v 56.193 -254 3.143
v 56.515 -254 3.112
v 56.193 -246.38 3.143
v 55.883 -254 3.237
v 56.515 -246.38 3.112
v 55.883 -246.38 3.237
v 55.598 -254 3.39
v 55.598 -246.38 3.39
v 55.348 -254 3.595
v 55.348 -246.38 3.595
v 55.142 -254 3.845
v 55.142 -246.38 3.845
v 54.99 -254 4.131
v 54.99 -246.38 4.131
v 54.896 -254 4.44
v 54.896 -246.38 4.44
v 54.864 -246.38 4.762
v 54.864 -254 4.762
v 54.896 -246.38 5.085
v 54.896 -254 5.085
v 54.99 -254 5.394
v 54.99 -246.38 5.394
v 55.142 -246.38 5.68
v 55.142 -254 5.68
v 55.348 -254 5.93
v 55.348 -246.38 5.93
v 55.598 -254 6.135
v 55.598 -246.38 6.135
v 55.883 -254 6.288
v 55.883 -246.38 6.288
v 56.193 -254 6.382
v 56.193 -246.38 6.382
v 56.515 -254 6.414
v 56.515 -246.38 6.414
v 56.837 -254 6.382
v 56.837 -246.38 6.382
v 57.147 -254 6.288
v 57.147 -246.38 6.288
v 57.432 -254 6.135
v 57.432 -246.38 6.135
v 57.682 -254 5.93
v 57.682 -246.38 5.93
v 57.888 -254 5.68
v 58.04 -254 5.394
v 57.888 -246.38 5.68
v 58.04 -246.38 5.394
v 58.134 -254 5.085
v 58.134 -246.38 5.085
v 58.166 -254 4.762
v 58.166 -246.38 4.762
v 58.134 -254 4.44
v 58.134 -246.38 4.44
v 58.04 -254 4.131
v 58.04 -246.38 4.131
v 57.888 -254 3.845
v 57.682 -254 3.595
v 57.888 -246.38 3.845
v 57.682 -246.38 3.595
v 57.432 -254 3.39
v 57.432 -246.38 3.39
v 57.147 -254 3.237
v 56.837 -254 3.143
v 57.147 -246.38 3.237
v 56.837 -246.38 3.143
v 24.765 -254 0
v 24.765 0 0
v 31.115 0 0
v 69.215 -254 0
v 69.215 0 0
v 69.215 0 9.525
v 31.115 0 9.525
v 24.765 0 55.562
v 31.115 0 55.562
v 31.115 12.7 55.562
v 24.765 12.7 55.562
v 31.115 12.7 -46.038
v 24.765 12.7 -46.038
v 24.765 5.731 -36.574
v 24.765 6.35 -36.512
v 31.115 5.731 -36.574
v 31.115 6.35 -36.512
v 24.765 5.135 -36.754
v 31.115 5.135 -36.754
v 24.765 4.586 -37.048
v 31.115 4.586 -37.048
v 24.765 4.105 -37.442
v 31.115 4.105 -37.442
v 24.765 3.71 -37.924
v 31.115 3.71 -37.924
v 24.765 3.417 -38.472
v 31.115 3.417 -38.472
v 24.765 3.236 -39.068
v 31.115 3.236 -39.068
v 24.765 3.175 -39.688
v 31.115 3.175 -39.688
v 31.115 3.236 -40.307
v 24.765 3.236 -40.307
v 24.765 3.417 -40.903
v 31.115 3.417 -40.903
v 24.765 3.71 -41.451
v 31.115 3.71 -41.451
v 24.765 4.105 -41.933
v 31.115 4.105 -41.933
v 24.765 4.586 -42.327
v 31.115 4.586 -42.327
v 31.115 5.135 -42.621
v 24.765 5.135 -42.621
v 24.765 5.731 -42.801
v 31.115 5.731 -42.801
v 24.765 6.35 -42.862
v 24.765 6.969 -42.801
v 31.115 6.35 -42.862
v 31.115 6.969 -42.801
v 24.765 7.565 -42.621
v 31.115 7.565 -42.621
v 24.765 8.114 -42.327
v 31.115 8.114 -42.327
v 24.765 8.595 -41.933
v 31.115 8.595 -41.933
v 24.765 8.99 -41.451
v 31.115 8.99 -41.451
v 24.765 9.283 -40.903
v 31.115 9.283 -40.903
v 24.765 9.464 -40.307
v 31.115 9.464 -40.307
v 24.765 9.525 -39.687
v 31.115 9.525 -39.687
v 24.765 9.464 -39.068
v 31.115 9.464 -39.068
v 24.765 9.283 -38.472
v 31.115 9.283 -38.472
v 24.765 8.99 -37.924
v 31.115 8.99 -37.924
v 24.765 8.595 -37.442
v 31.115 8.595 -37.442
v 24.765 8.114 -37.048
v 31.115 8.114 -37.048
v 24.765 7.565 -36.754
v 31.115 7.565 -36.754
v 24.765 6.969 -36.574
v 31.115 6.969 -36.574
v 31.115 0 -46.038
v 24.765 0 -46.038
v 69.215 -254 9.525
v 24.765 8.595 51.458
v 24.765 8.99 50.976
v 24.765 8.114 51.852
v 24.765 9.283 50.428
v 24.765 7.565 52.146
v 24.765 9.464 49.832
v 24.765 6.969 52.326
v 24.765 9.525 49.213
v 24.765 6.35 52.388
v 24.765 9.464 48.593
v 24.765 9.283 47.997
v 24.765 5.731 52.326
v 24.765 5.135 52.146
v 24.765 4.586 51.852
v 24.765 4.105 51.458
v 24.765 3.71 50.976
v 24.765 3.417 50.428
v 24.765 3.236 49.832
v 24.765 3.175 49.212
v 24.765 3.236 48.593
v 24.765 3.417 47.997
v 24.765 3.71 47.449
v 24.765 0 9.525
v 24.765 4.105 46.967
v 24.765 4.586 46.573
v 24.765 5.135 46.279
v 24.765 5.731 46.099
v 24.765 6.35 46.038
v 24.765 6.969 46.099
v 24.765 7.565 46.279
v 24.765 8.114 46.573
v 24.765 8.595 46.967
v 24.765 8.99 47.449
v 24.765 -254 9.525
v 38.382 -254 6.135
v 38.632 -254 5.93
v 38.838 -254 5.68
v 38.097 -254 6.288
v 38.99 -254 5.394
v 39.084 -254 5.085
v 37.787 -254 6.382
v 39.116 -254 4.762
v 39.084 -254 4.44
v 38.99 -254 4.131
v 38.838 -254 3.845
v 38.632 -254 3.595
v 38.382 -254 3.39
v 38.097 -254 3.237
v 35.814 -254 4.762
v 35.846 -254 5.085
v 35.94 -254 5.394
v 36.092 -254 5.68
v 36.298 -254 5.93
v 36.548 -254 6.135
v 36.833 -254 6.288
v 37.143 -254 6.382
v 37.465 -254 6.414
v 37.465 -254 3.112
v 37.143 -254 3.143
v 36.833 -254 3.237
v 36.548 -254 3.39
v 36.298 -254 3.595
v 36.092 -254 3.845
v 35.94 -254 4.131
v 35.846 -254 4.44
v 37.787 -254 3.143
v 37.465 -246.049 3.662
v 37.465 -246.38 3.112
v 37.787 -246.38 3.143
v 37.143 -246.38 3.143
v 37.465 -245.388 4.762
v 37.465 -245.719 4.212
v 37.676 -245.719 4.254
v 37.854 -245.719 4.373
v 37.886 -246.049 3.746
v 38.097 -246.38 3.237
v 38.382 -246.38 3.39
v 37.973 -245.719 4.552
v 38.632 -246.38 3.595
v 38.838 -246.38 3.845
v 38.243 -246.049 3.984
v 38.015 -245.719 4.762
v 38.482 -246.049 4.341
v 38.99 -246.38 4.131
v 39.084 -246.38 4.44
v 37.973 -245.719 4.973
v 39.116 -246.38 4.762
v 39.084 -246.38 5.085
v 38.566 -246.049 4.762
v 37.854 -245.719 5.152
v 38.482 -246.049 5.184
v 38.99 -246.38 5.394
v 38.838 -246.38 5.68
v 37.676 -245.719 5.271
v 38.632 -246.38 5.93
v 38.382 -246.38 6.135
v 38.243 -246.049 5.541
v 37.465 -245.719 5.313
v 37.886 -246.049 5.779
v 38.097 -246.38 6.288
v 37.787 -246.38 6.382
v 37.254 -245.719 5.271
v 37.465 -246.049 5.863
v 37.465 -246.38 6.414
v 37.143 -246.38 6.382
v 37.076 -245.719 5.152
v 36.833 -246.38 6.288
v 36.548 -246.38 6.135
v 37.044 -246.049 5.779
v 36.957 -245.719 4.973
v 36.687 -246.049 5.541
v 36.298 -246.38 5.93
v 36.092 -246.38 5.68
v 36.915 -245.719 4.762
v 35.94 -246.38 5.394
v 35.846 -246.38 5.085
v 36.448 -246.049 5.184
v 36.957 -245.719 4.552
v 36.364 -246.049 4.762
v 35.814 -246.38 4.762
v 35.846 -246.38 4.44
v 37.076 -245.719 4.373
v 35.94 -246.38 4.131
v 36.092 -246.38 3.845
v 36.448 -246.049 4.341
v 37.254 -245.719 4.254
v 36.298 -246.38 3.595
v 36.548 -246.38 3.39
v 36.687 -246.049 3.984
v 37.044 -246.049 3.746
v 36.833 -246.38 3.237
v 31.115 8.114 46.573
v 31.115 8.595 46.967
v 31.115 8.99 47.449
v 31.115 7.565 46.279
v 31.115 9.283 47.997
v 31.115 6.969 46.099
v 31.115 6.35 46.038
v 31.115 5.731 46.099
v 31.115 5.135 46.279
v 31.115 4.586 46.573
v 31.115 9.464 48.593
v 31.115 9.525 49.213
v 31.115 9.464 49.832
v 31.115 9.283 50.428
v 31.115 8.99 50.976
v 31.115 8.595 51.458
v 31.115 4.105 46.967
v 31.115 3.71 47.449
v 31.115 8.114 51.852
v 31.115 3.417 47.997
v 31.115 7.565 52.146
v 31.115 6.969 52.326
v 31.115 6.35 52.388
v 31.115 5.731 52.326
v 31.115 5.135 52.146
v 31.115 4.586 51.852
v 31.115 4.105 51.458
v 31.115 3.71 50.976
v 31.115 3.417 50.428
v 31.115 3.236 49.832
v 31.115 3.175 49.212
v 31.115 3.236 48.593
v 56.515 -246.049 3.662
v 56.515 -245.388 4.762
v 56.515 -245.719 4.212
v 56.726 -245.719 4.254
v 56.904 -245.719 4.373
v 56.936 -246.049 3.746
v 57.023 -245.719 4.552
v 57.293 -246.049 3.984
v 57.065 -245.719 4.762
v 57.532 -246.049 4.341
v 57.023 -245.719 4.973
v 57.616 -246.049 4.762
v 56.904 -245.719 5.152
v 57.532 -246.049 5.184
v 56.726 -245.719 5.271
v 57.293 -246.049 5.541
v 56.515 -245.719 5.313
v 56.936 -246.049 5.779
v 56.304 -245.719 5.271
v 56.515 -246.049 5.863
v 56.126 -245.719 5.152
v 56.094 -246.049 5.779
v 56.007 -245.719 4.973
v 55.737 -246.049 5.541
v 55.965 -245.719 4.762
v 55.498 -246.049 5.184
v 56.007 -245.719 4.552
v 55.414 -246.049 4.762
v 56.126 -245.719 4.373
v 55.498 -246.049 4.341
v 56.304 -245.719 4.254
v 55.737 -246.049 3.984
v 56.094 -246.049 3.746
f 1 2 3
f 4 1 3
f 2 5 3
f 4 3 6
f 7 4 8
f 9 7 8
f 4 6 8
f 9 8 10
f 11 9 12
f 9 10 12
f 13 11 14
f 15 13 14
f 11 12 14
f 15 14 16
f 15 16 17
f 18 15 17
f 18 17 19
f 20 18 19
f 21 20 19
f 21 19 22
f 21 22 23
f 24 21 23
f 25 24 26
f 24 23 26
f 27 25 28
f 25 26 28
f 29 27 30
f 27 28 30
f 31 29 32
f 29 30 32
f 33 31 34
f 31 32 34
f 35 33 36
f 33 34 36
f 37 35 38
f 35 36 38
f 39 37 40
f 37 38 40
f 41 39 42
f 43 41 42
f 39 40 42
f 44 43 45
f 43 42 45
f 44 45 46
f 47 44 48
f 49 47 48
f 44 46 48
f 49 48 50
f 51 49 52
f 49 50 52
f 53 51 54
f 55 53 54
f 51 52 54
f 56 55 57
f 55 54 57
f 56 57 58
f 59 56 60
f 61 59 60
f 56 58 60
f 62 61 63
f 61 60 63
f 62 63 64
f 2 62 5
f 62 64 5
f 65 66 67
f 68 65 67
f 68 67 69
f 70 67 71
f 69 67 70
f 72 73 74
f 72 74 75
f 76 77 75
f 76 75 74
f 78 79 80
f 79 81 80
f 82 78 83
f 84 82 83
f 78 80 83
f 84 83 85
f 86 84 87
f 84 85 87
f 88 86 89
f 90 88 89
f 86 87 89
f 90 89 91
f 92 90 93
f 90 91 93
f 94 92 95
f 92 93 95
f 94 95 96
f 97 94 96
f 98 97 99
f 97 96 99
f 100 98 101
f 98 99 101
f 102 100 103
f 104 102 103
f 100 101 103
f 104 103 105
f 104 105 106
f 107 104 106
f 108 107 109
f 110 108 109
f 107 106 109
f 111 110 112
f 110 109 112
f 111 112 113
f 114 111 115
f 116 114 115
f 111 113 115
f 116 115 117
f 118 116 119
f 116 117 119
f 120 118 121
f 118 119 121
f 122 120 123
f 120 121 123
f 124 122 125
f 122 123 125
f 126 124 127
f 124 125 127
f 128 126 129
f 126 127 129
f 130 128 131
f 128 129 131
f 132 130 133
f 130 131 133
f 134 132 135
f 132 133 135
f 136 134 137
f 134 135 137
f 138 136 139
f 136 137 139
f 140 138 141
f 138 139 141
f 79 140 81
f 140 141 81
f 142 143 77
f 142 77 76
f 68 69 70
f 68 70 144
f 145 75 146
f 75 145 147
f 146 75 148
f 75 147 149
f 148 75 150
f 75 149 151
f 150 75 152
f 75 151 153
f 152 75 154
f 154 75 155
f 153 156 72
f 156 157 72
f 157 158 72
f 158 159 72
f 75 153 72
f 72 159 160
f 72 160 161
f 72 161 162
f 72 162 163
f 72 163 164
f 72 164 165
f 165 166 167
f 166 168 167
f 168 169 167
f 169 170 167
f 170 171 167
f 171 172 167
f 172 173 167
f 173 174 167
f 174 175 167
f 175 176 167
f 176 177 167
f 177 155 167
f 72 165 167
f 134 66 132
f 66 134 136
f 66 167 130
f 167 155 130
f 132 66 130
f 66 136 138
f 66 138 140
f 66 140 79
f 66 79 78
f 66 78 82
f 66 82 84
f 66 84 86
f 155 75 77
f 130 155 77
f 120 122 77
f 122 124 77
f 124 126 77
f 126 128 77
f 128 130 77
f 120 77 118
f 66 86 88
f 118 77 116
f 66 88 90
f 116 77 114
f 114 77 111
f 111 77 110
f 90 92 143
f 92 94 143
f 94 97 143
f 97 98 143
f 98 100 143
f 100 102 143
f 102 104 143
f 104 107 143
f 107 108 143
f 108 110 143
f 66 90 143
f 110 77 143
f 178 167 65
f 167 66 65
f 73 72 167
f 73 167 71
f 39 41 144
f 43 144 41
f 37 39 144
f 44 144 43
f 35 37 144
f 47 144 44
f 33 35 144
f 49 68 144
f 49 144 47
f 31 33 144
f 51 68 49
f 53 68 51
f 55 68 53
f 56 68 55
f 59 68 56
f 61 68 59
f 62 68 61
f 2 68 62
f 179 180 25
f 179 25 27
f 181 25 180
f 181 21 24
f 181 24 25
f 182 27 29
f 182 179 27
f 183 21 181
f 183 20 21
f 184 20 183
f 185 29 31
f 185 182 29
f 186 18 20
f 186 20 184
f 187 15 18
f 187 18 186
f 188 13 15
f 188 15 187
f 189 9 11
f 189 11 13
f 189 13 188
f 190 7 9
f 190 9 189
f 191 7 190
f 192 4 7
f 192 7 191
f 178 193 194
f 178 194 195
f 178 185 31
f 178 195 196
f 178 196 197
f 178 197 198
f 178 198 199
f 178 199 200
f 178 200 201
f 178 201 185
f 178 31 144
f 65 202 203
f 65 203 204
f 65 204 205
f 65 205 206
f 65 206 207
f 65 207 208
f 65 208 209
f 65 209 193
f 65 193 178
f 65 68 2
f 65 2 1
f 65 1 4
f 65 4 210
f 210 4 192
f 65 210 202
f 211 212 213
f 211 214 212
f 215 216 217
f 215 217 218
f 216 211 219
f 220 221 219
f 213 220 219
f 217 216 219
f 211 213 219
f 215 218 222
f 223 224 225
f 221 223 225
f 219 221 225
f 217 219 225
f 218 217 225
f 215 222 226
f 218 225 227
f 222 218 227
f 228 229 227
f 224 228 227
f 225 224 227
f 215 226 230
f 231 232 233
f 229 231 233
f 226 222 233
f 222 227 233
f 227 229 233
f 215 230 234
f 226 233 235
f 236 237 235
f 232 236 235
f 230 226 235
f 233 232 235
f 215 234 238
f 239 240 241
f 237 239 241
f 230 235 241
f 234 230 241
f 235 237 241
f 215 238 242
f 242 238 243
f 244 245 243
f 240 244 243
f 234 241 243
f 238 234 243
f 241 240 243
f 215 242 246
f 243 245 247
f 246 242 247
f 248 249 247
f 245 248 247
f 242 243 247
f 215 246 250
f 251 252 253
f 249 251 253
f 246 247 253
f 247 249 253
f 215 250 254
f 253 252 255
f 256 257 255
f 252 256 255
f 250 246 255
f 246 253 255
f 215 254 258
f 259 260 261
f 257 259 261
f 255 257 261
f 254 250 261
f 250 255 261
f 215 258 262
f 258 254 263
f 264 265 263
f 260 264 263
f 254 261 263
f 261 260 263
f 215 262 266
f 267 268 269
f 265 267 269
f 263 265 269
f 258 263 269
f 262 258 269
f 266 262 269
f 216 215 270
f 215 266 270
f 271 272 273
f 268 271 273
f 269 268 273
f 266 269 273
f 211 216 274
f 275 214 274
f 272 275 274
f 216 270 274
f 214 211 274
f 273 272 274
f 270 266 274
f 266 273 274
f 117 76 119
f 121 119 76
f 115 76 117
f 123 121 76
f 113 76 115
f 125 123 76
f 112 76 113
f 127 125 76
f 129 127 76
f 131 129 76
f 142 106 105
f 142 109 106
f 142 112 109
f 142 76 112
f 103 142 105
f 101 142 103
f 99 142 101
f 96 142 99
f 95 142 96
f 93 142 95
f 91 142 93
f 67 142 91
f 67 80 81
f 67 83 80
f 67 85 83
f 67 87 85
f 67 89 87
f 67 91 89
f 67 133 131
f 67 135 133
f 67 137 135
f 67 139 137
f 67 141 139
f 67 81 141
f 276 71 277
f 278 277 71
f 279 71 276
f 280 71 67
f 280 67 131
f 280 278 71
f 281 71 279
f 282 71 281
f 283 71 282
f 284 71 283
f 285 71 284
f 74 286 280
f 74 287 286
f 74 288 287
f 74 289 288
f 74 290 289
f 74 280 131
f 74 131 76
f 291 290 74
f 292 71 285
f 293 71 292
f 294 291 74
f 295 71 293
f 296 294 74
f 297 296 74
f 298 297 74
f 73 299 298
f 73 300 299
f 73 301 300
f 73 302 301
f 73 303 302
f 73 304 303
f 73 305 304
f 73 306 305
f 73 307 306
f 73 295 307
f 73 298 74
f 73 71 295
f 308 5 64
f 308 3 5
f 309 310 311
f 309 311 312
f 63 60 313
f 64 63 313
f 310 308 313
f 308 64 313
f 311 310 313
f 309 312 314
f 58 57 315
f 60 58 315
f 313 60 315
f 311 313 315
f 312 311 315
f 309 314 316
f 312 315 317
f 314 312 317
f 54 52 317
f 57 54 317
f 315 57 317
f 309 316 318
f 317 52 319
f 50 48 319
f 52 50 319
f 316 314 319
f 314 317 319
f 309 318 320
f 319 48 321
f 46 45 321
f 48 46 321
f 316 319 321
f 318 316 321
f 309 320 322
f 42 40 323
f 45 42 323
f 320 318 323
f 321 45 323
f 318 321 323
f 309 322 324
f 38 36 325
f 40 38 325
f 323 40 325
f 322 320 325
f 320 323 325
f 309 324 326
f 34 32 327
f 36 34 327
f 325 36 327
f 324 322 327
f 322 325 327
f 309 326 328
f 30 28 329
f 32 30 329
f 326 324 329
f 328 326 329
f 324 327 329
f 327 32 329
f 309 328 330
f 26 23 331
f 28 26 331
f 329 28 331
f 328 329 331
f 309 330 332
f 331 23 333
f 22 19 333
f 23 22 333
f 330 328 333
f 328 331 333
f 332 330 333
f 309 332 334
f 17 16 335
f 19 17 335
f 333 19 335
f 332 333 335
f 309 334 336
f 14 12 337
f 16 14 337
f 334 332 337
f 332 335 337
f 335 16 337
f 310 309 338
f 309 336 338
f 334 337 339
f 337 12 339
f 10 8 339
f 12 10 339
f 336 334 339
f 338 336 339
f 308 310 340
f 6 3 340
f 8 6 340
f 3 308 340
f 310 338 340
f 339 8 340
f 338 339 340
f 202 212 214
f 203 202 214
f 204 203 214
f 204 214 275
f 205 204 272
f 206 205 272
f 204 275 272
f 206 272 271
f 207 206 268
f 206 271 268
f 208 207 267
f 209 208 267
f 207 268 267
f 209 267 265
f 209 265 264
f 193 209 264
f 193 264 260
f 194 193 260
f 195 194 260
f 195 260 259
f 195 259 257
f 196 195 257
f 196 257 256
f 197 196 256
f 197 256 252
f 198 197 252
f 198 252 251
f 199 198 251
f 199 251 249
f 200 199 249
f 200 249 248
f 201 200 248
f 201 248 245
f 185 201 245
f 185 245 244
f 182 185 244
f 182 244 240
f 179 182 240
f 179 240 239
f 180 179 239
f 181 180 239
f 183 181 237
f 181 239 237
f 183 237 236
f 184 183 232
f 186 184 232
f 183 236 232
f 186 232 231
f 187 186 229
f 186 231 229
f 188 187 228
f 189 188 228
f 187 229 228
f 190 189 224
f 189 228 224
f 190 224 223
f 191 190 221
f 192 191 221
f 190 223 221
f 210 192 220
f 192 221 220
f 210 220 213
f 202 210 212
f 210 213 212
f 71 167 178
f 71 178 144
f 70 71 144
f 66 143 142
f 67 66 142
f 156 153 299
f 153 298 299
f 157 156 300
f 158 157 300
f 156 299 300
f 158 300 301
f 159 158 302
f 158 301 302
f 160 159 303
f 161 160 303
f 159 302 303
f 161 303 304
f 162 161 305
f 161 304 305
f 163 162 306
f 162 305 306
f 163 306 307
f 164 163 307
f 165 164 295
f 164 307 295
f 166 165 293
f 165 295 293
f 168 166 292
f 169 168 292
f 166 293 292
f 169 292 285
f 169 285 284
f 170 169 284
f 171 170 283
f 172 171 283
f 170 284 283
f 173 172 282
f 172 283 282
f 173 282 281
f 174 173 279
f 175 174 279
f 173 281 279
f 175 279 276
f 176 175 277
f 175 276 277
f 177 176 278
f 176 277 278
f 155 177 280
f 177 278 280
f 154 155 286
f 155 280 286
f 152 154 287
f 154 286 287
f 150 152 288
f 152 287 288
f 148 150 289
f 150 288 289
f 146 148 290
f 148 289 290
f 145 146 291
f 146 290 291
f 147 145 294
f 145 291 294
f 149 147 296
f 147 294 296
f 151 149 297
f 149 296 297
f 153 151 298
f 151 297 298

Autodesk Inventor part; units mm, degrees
ref_plane "YZ Plane" through (0, 0, 0) normal (1, 0, 0) x (0, 1, 0)
ref_plane "XZ Plane" through (0, 0, 0) normal (0, 1, 0) x (-1, 0, 0)
ref_plane "XY Plane" through (0, 0, 0) normal (0, 0, 1) x (1, 0, 0)
sketch "Sketch1" plane through (0, 0, 0) normal (0, 0, 1) x (1, 0, 0)
  line L0 (0, 0) -> (69.215, 0)
  line L1 (69.215, 0) -> (69.215, -254)
  line L2 (69.215, -254) -> (0, -254)
  line L3 (0, -254) -> (0, 0)
  dimension "d0" = 69.215
  dimension "d1" = 254
extrude "Extrusion1" add sketch "Sketch1" along normal blind 9.525
sketch "Sketch4" plane through (0, 0, 0) normal (0, 0, -1) x (-1, 0, 0)
  line L0 (-69.215, -254) -> (0, -254) projected
  line L1 (0, 0) -> (-24.765, 0)
  line L2 (-24.765, 0) -> (-24.765, -254)
  line L3 (-24.765, -254) -> (0, -254)
  line L4 (0, -254) -> (0, 0)
  dimension "d11" = 24.765
extrude "Extrusion4" cut sketch "Sketch4" against normal blind 127
sketch "Sketch5" plane through (69.215, -254, 0) normal (0, -1, 0) x (1, 0, 0)
  point P0 (-69.215, 0)
sketch "Sketch9" plane through (69.215, -254, 0) normal (0, -1, 0) x (1, 0, 0)
  line L0 (-44.45, 9.525) -> (-44.45, 0) projected
  line L1 (0, 0) -> (0, 9.525) projected
  point P0 (-69.215, 0)
  point P1 (-12.7, 4.7625)
  point P2 (-31.75, 4.7625)
hole "Hole2" at (37.465, -254, 4.7625) at (56.515, -254, 4.7625) direction (0, 1, 0) diameter 3.302 depth 7.62 tip angle 118 thread size "8-32 UNC" class "2B" standard "ANSI Unified Screw Threads"
sketch "Sketch11" plane through (69.215, 0, 9.525) normal (0, 1, 0) x (1, 0, 0)
  line L0 (-38.1, -46.0375) -> (-44.45, -46.0375)
  line L1 (-44.45, -46.0375) -> (-44.45, 55.5625)
  line L2 (-44.45, 55.5625) -> (-38.1, 55.5625)
  line L3 (-38.1, 55.5625) -> (-38.1, -46.0375)
  line L4 (-44.45, 9.525) -> (-44.45, 0) projected
  line L5 (0, 0) -> (-44.45, 0) projected
  line L6 (0, 9.525) -> (0, 0) projected
  line L7 (-44.45, 9.525) -> (0, 9.525) projected
  point P0 (-69.215, 9.525)
  dimension "d41" = 6.35
  dimension "d42" = 101.6
  dimension "d44" = 9.525
  dimension "d45" = 46.0375
  dimension "d46" = 0
extrude "Extrusion7" add sketch "Sketch11" along normal blind 12.7 contours L0 L1 L5 L3 | L5 L1 L7 L3 | L7 L1 L2 L3
sketch "Sketch12" plane through (24.765, -254, 0) normal (-1, 0, 0) x (0, 0, 1)
  line L0 (9.525, 254) -> (9.525, 0) projected
  line L1 (55.5625, 254) -> (9.525, 254) projected
  line L2 (55.5625, 254) -> (55.5625, 266.7) projected
  line L3 (-46.0375, 266.7) -> (55.5625, 266.7) projected
  line L4 (-46.0375, 254) -> (-46.0375, 266.7) projected
  line L5 (0, 254) -> (-46.0375, 254) projected
  line L6 (0, 0) -> (0, 254) projected
  line L7 (9.525, 0) -> (0, 0) projected
  point P0 (-39.6875, 260.35)
  point P1 (49.2125, 260.35)
  dimension "d49" = 12.7
  dimension "d50" = 6.35
  dimension "d51" = 6.35
  dimension "d52" = 6.35
  dimension "d53" = 6.35
hole "Hole3" at (24.765, 6.35, -39.6875) at (24.765, 6.35, 49.2125) direction (1, 0, 0) diameter 6.35 depth 25.4 tip angle 118
equation "\"d45\" = -0.5 * d44 + 0.5 * d42"
equation "\"d50\" = 0.5 * d49"
equation "\"d51\" = d50"
equation "\"d52\" = d50"
equation "\"d53\" = d52"
properties part number "LeftSideTopPlateConnector"
